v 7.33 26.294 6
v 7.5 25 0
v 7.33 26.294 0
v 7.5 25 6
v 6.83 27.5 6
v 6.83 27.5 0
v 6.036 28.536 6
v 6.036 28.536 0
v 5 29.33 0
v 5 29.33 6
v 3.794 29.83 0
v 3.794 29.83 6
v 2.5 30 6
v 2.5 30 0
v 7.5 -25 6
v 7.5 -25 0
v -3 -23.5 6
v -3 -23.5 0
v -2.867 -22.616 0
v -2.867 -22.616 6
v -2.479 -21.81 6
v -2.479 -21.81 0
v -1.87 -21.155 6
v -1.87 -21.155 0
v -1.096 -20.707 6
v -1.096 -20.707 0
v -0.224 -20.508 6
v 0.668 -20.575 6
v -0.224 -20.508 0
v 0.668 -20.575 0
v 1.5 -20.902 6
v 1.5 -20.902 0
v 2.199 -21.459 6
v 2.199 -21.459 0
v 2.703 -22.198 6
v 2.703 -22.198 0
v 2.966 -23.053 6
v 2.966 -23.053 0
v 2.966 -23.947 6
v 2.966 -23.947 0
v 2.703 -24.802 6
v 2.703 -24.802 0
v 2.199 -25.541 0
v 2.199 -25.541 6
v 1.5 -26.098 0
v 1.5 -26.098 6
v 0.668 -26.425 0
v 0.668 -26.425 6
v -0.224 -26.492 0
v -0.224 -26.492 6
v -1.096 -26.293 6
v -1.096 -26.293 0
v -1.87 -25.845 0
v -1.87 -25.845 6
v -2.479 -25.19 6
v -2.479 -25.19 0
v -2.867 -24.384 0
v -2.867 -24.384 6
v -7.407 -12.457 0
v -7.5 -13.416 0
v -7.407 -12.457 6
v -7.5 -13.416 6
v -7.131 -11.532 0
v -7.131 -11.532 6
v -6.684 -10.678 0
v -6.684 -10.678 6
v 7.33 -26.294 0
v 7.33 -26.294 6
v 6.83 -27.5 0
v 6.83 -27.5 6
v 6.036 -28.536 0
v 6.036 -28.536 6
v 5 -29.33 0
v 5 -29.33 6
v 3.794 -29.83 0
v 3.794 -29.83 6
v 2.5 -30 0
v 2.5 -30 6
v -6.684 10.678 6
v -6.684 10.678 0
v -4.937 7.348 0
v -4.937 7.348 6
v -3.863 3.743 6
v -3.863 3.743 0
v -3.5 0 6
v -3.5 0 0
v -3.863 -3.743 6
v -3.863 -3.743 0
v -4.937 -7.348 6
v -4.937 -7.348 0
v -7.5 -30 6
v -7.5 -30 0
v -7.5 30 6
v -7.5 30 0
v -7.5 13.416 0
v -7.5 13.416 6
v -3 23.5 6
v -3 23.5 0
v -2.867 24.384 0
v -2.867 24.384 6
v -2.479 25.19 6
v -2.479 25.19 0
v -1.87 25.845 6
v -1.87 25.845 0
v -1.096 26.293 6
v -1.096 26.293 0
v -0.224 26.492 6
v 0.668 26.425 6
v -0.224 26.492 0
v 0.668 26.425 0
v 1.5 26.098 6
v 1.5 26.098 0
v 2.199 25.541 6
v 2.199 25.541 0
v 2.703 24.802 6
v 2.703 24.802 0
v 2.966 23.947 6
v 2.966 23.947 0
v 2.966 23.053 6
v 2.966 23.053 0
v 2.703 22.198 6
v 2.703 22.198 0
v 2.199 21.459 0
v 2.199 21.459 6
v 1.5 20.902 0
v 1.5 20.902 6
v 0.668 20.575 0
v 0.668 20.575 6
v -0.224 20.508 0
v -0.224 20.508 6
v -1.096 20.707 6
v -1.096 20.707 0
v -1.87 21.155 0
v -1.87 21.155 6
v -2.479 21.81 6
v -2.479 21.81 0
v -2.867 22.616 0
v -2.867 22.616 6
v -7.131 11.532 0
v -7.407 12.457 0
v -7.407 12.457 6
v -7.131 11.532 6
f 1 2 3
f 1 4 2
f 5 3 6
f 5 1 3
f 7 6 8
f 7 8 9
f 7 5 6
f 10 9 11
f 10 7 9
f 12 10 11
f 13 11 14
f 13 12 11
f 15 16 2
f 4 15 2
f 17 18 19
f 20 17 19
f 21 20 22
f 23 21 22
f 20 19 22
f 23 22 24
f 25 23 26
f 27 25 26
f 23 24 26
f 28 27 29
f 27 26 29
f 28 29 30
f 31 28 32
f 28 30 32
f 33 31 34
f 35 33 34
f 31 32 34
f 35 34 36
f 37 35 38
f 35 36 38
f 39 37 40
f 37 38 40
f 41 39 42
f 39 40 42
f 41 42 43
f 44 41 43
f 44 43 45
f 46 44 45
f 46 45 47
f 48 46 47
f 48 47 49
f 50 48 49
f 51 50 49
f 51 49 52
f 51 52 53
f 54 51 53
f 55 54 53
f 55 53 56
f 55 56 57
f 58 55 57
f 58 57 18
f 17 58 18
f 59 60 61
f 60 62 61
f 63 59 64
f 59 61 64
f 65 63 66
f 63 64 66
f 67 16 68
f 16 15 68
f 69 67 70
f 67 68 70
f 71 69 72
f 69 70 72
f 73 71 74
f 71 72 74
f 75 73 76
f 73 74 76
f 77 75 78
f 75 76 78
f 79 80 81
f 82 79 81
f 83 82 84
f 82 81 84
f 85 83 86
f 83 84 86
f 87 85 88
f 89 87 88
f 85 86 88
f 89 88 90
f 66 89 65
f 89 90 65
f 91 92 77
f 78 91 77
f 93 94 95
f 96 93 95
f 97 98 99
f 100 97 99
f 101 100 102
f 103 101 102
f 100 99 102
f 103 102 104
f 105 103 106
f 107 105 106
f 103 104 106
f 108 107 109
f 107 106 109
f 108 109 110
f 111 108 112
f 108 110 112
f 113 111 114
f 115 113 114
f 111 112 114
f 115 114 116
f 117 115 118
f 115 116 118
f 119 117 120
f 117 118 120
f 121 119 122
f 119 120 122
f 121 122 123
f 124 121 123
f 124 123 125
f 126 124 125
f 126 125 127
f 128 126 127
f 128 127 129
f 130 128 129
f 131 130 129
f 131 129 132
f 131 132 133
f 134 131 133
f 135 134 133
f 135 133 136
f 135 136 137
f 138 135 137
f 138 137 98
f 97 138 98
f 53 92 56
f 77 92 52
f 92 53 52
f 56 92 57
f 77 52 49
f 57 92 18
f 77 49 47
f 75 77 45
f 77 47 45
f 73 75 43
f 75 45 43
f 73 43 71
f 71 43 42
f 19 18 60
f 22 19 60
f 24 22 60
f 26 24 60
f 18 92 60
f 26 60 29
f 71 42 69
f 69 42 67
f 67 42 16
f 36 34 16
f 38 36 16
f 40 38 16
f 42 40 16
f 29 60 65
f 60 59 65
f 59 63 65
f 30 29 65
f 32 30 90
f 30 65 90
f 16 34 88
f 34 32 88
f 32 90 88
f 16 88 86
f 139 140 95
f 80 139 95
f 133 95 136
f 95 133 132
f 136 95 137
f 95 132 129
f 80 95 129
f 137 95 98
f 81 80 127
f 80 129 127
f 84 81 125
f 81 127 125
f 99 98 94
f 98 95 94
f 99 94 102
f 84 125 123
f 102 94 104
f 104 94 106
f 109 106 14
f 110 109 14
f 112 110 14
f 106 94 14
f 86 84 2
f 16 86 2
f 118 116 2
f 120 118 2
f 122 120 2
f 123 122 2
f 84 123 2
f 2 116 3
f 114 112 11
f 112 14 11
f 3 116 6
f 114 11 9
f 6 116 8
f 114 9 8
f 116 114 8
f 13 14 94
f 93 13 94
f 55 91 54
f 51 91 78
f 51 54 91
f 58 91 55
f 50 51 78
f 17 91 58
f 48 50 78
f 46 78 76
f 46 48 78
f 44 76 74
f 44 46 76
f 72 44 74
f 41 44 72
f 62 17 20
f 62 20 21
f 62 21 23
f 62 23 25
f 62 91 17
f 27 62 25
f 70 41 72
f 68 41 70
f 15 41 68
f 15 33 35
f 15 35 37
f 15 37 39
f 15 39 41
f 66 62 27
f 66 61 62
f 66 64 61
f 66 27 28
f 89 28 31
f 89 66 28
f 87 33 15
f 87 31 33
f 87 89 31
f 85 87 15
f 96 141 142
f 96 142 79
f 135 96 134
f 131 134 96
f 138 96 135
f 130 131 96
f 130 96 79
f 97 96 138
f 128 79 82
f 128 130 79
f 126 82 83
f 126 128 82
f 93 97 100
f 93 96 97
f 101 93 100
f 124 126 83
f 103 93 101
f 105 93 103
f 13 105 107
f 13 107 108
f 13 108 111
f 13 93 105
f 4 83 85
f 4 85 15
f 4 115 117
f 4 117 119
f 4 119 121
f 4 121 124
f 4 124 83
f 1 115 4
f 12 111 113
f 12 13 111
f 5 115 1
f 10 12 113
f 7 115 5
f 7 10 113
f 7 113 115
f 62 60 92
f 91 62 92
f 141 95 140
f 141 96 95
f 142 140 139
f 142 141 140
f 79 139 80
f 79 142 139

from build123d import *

# Parameters (mm, degrees)
F1_DEPTH = 6
F3_D     = 6
F4_R     = 5


with BuildPart() as f1:
    # F0 (on Top) → F1 (new body)
    with BuildSketch(Plane.XY):
        with BuildLine():
            Line((7.5, -30), (7.5, 30))
            Line((7.5, 30), (-7.5, 30))
            Line((-7.5, 30), (-7.5, 11.83216))
            ThreePointArc((-7.5, 11.83216), (-3.5, 0), (-7.5, -11.83216))
            Line((-7.5, -11.83216), (-7.5, -30))
            Line((-7.5, -30), (7.5, -30))
        make_face()
    extrude(amount=F1_DEPTH)

    # F3 (through all)
    with Locations(Plane.XY.offset(6)):
        with Locations((0, 23.5), (0, -23.5)):
            Hole(F3_D / 2)

    # F4
    f4_edges = [f1.edges().sort_by_distance(p)[0] for p in [
        (7.5, 30, 3),
        (7.5, -30, 3),
        (-7.5, -11.83216, 3),
        (-7.5, 11.83216, 3),
    ]]
    fillet(f4_edges, radius=F4_R)


solid = f1.part
